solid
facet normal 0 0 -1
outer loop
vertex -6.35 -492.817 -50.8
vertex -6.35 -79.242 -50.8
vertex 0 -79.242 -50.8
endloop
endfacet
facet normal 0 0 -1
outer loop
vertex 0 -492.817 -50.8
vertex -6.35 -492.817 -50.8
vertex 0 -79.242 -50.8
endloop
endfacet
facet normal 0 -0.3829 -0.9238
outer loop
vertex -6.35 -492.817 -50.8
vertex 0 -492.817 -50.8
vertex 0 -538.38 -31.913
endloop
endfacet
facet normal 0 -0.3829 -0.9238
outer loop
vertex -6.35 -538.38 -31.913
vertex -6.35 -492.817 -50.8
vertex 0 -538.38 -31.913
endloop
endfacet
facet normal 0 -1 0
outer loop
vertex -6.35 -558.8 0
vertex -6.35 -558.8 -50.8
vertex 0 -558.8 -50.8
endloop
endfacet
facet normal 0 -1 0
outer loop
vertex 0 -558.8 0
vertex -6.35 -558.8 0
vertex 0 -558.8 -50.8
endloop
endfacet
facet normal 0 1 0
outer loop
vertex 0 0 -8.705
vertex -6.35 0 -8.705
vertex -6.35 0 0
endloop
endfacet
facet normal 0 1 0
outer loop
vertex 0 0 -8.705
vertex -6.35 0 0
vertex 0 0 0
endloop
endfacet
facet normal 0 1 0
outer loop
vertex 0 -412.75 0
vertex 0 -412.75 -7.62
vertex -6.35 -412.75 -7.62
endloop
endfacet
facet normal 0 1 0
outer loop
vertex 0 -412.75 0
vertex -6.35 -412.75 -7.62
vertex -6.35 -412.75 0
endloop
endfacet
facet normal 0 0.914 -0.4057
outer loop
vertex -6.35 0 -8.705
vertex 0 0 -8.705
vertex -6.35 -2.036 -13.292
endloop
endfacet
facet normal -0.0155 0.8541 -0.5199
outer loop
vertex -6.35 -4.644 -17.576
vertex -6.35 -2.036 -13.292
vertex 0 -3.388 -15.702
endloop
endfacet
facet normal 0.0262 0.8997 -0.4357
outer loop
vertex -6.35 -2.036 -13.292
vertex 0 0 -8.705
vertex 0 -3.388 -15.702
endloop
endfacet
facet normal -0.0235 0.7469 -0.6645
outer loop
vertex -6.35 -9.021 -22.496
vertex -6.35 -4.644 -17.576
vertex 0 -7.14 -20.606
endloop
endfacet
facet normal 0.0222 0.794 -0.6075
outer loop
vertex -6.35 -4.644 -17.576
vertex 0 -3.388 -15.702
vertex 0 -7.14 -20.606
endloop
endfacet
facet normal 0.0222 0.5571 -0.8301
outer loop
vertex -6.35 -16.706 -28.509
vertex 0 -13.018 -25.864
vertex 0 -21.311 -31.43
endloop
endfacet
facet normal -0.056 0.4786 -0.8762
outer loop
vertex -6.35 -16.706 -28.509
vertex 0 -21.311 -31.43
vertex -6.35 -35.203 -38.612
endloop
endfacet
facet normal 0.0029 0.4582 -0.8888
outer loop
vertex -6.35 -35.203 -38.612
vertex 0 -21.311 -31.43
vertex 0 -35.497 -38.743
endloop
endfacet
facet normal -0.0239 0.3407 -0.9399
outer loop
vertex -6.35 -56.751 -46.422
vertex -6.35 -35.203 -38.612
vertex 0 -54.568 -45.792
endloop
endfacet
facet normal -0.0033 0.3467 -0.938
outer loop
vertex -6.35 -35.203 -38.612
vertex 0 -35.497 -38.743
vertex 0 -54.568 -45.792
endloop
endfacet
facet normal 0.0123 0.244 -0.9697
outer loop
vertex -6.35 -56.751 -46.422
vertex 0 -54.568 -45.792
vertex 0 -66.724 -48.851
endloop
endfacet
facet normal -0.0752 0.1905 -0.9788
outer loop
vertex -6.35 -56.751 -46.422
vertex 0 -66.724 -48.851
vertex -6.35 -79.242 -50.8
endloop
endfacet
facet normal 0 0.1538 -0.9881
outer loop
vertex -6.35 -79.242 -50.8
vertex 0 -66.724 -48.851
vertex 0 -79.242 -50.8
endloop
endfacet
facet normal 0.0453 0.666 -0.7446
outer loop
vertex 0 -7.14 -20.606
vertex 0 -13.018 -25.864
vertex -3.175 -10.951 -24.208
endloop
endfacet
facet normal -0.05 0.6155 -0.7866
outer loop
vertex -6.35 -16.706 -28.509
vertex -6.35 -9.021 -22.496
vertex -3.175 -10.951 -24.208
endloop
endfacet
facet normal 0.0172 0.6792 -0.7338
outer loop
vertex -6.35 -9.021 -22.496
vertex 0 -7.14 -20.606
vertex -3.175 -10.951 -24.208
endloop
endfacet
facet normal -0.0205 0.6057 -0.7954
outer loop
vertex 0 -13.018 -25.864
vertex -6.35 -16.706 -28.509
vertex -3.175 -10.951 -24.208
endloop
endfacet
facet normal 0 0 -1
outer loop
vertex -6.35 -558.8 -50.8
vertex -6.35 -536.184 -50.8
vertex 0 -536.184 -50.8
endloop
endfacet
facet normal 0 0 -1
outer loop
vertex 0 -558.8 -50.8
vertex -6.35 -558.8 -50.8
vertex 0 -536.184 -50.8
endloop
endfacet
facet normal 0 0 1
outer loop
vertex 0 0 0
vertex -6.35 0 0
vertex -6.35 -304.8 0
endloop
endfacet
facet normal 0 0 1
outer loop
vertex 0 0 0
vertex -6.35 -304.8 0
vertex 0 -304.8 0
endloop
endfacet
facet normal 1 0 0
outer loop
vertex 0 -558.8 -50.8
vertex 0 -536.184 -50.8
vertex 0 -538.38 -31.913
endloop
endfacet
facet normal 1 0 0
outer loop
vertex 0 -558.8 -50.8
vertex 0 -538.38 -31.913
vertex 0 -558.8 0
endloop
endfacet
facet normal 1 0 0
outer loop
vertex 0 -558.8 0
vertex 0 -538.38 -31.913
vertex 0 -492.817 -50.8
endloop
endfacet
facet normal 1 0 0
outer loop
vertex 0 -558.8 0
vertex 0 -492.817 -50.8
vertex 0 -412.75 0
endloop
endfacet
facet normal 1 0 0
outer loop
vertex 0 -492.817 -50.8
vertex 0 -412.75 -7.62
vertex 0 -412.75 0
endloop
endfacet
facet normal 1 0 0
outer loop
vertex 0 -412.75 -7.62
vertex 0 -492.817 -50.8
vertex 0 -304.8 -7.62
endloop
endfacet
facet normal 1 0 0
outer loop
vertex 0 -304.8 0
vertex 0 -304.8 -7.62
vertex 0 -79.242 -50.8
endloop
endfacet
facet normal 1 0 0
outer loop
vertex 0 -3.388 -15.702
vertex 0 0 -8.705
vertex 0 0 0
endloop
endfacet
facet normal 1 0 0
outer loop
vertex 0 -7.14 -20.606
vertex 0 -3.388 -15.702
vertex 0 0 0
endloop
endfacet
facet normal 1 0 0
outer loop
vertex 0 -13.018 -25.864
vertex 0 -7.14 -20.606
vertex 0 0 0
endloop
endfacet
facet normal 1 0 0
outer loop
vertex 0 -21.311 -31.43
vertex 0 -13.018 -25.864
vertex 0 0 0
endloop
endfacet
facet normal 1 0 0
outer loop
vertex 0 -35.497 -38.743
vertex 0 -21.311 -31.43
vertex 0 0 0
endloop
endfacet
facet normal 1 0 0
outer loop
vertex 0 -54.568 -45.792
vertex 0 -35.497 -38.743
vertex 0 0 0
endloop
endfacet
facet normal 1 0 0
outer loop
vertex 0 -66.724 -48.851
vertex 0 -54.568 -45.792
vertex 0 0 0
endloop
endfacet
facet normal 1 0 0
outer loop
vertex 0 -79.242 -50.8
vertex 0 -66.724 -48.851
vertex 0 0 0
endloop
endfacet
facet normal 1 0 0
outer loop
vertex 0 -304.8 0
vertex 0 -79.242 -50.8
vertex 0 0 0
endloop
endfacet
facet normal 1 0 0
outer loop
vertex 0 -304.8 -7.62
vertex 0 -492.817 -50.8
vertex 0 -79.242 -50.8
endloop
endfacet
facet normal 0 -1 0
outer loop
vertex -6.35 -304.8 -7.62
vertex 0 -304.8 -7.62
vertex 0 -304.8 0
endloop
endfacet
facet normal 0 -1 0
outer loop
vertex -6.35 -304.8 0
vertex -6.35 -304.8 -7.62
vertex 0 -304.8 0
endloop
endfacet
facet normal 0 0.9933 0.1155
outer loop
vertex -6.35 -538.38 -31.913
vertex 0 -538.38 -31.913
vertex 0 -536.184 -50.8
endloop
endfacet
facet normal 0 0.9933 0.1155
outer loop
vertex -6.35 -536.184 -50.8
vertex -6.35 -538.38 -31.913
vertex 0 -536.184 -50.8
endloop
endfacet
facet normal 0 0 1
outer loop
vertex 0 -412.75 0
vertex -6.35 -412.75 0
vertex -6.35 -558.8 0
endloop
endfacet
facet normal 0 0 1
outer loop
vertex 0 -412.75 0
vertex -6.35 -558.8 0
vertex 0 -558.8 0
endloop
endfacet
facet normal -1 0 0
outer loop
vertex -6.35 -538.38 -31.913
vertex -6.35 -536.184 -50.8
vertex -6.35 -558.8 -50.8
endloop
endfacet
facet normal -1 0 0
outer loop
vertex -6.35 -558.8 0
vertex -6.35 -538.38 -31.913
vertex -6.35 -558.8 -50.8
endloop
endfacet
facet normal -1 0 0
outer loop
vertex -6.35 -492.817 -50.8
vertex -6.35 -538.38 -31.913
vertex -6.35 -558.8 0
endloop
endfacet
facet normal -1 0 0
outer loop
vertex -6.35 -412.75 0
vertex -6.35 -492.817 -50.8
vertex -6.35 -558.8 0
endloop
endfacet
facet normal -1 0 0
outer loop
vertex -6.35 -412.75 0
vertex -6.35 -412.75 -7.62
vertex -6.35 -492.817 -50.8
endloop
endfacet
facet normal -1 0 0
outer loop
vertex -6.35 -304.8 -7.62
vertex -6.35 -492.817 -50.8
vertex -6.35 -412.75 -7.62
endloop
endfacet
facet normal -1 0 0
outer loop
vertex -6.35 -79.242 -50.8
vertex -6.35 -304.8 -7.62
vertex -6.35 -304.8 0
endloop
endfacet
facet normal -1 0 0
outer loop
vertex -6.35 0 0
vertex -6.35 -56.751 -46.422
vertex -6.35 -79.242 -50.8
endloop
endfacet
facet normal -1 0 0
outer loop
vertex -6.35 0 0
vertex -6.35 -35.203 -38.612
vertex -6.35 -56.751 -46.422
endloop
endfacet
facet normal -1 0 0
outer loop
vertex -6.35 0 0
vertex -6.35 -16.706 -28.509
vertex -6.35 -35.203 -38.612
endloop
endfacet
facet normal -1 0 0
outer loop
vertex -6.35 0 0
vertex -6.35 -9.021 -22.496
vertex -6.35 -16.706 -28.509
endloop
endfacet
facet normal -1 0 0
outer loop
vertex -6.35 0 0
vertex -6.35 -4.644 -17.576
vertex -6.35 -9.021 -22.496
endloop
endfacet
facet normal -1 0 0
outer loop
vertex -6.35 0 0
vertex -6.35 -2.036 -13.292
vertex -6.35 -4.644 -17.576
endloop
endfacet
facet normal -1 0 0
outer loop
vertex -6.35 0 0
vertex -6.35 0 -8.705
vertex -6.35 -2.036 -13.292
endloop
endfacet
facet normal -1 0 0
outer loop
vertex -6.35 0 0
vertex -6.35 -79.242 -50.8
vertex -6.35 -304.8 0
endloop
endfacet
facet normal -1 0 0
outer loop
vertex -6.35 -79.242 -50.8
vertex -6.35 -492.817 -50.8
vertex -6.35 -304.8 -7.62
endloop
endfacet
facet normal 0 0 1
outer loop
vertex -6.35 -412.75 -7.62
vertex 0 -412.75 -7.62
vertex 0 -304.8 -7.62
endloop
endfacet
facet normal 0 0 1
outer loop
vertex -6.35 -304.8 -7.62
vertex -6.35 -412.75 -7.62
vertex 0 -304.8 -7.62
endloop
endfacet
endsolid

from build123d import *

# Parameters (mm, degrees)
F0_W     = 6.35
F0_H     = 50.8
F1_DEPTH = 558.8
F3_DEPTH = 304.8
F4_W     = 107.95
F4_H     = 7.62
F5_DEPTH = 304.8
F7_DEPTH = 25.4


with BuildPart() as f1:
    # F0 (on Front) → F1 (new body)
    with BuildSketch(Plane.XZ):
        with Locations((-3.175, -25.4)):
            Rectangle(F0_W, F0_H)
    extrude(amount=F1_DEPTH)

    # F2 (on face) → F3 (cut)
    with BuildSketch(Plane.YZ):
        Polygon((-538.3797883987, -31.9133784294), (-536.1839532852, -50.8), (-492.8166270256, -50.8), align=None)
    extrude(amount=-F3_DEPTH, mode=Mode.SUBTRACT)

    # F4 (on face) → F5 (cut)
    with BuildSketch(Plane.YZ):
        with Locations((-358.775, -3.81)):
            Rectangle(F4_W, F4_H)
    extrude(amount=-F5_DEPTH, mode=Mode.SUBTRACT)

    # F6 (on face) → F7 (cut)
    with BuildSketch(Plane.YZ):
        with BuildLine():
            Line((0, -50.8), (0, -8.7046129629))
            add(Edge.make_bspline(
                [(0, -8.7046129629), (-2.2023392611, -14.2512334073), (-9.3405414865, -27.9675195006), (-51.0574173798, -47.8762926406), (-79.2421847582, -50.8)],
                knots=[0, 0, 0, 0, 0.3372731327, 1, 1, 1, 1], degree=3))
            Line((-79.2421847582, -50.8), (0, -50.8))
        make_face()
    extrude(amount=-F7_DEPTH, mode=Mode.SUBTRACT)


solid = f1.part
